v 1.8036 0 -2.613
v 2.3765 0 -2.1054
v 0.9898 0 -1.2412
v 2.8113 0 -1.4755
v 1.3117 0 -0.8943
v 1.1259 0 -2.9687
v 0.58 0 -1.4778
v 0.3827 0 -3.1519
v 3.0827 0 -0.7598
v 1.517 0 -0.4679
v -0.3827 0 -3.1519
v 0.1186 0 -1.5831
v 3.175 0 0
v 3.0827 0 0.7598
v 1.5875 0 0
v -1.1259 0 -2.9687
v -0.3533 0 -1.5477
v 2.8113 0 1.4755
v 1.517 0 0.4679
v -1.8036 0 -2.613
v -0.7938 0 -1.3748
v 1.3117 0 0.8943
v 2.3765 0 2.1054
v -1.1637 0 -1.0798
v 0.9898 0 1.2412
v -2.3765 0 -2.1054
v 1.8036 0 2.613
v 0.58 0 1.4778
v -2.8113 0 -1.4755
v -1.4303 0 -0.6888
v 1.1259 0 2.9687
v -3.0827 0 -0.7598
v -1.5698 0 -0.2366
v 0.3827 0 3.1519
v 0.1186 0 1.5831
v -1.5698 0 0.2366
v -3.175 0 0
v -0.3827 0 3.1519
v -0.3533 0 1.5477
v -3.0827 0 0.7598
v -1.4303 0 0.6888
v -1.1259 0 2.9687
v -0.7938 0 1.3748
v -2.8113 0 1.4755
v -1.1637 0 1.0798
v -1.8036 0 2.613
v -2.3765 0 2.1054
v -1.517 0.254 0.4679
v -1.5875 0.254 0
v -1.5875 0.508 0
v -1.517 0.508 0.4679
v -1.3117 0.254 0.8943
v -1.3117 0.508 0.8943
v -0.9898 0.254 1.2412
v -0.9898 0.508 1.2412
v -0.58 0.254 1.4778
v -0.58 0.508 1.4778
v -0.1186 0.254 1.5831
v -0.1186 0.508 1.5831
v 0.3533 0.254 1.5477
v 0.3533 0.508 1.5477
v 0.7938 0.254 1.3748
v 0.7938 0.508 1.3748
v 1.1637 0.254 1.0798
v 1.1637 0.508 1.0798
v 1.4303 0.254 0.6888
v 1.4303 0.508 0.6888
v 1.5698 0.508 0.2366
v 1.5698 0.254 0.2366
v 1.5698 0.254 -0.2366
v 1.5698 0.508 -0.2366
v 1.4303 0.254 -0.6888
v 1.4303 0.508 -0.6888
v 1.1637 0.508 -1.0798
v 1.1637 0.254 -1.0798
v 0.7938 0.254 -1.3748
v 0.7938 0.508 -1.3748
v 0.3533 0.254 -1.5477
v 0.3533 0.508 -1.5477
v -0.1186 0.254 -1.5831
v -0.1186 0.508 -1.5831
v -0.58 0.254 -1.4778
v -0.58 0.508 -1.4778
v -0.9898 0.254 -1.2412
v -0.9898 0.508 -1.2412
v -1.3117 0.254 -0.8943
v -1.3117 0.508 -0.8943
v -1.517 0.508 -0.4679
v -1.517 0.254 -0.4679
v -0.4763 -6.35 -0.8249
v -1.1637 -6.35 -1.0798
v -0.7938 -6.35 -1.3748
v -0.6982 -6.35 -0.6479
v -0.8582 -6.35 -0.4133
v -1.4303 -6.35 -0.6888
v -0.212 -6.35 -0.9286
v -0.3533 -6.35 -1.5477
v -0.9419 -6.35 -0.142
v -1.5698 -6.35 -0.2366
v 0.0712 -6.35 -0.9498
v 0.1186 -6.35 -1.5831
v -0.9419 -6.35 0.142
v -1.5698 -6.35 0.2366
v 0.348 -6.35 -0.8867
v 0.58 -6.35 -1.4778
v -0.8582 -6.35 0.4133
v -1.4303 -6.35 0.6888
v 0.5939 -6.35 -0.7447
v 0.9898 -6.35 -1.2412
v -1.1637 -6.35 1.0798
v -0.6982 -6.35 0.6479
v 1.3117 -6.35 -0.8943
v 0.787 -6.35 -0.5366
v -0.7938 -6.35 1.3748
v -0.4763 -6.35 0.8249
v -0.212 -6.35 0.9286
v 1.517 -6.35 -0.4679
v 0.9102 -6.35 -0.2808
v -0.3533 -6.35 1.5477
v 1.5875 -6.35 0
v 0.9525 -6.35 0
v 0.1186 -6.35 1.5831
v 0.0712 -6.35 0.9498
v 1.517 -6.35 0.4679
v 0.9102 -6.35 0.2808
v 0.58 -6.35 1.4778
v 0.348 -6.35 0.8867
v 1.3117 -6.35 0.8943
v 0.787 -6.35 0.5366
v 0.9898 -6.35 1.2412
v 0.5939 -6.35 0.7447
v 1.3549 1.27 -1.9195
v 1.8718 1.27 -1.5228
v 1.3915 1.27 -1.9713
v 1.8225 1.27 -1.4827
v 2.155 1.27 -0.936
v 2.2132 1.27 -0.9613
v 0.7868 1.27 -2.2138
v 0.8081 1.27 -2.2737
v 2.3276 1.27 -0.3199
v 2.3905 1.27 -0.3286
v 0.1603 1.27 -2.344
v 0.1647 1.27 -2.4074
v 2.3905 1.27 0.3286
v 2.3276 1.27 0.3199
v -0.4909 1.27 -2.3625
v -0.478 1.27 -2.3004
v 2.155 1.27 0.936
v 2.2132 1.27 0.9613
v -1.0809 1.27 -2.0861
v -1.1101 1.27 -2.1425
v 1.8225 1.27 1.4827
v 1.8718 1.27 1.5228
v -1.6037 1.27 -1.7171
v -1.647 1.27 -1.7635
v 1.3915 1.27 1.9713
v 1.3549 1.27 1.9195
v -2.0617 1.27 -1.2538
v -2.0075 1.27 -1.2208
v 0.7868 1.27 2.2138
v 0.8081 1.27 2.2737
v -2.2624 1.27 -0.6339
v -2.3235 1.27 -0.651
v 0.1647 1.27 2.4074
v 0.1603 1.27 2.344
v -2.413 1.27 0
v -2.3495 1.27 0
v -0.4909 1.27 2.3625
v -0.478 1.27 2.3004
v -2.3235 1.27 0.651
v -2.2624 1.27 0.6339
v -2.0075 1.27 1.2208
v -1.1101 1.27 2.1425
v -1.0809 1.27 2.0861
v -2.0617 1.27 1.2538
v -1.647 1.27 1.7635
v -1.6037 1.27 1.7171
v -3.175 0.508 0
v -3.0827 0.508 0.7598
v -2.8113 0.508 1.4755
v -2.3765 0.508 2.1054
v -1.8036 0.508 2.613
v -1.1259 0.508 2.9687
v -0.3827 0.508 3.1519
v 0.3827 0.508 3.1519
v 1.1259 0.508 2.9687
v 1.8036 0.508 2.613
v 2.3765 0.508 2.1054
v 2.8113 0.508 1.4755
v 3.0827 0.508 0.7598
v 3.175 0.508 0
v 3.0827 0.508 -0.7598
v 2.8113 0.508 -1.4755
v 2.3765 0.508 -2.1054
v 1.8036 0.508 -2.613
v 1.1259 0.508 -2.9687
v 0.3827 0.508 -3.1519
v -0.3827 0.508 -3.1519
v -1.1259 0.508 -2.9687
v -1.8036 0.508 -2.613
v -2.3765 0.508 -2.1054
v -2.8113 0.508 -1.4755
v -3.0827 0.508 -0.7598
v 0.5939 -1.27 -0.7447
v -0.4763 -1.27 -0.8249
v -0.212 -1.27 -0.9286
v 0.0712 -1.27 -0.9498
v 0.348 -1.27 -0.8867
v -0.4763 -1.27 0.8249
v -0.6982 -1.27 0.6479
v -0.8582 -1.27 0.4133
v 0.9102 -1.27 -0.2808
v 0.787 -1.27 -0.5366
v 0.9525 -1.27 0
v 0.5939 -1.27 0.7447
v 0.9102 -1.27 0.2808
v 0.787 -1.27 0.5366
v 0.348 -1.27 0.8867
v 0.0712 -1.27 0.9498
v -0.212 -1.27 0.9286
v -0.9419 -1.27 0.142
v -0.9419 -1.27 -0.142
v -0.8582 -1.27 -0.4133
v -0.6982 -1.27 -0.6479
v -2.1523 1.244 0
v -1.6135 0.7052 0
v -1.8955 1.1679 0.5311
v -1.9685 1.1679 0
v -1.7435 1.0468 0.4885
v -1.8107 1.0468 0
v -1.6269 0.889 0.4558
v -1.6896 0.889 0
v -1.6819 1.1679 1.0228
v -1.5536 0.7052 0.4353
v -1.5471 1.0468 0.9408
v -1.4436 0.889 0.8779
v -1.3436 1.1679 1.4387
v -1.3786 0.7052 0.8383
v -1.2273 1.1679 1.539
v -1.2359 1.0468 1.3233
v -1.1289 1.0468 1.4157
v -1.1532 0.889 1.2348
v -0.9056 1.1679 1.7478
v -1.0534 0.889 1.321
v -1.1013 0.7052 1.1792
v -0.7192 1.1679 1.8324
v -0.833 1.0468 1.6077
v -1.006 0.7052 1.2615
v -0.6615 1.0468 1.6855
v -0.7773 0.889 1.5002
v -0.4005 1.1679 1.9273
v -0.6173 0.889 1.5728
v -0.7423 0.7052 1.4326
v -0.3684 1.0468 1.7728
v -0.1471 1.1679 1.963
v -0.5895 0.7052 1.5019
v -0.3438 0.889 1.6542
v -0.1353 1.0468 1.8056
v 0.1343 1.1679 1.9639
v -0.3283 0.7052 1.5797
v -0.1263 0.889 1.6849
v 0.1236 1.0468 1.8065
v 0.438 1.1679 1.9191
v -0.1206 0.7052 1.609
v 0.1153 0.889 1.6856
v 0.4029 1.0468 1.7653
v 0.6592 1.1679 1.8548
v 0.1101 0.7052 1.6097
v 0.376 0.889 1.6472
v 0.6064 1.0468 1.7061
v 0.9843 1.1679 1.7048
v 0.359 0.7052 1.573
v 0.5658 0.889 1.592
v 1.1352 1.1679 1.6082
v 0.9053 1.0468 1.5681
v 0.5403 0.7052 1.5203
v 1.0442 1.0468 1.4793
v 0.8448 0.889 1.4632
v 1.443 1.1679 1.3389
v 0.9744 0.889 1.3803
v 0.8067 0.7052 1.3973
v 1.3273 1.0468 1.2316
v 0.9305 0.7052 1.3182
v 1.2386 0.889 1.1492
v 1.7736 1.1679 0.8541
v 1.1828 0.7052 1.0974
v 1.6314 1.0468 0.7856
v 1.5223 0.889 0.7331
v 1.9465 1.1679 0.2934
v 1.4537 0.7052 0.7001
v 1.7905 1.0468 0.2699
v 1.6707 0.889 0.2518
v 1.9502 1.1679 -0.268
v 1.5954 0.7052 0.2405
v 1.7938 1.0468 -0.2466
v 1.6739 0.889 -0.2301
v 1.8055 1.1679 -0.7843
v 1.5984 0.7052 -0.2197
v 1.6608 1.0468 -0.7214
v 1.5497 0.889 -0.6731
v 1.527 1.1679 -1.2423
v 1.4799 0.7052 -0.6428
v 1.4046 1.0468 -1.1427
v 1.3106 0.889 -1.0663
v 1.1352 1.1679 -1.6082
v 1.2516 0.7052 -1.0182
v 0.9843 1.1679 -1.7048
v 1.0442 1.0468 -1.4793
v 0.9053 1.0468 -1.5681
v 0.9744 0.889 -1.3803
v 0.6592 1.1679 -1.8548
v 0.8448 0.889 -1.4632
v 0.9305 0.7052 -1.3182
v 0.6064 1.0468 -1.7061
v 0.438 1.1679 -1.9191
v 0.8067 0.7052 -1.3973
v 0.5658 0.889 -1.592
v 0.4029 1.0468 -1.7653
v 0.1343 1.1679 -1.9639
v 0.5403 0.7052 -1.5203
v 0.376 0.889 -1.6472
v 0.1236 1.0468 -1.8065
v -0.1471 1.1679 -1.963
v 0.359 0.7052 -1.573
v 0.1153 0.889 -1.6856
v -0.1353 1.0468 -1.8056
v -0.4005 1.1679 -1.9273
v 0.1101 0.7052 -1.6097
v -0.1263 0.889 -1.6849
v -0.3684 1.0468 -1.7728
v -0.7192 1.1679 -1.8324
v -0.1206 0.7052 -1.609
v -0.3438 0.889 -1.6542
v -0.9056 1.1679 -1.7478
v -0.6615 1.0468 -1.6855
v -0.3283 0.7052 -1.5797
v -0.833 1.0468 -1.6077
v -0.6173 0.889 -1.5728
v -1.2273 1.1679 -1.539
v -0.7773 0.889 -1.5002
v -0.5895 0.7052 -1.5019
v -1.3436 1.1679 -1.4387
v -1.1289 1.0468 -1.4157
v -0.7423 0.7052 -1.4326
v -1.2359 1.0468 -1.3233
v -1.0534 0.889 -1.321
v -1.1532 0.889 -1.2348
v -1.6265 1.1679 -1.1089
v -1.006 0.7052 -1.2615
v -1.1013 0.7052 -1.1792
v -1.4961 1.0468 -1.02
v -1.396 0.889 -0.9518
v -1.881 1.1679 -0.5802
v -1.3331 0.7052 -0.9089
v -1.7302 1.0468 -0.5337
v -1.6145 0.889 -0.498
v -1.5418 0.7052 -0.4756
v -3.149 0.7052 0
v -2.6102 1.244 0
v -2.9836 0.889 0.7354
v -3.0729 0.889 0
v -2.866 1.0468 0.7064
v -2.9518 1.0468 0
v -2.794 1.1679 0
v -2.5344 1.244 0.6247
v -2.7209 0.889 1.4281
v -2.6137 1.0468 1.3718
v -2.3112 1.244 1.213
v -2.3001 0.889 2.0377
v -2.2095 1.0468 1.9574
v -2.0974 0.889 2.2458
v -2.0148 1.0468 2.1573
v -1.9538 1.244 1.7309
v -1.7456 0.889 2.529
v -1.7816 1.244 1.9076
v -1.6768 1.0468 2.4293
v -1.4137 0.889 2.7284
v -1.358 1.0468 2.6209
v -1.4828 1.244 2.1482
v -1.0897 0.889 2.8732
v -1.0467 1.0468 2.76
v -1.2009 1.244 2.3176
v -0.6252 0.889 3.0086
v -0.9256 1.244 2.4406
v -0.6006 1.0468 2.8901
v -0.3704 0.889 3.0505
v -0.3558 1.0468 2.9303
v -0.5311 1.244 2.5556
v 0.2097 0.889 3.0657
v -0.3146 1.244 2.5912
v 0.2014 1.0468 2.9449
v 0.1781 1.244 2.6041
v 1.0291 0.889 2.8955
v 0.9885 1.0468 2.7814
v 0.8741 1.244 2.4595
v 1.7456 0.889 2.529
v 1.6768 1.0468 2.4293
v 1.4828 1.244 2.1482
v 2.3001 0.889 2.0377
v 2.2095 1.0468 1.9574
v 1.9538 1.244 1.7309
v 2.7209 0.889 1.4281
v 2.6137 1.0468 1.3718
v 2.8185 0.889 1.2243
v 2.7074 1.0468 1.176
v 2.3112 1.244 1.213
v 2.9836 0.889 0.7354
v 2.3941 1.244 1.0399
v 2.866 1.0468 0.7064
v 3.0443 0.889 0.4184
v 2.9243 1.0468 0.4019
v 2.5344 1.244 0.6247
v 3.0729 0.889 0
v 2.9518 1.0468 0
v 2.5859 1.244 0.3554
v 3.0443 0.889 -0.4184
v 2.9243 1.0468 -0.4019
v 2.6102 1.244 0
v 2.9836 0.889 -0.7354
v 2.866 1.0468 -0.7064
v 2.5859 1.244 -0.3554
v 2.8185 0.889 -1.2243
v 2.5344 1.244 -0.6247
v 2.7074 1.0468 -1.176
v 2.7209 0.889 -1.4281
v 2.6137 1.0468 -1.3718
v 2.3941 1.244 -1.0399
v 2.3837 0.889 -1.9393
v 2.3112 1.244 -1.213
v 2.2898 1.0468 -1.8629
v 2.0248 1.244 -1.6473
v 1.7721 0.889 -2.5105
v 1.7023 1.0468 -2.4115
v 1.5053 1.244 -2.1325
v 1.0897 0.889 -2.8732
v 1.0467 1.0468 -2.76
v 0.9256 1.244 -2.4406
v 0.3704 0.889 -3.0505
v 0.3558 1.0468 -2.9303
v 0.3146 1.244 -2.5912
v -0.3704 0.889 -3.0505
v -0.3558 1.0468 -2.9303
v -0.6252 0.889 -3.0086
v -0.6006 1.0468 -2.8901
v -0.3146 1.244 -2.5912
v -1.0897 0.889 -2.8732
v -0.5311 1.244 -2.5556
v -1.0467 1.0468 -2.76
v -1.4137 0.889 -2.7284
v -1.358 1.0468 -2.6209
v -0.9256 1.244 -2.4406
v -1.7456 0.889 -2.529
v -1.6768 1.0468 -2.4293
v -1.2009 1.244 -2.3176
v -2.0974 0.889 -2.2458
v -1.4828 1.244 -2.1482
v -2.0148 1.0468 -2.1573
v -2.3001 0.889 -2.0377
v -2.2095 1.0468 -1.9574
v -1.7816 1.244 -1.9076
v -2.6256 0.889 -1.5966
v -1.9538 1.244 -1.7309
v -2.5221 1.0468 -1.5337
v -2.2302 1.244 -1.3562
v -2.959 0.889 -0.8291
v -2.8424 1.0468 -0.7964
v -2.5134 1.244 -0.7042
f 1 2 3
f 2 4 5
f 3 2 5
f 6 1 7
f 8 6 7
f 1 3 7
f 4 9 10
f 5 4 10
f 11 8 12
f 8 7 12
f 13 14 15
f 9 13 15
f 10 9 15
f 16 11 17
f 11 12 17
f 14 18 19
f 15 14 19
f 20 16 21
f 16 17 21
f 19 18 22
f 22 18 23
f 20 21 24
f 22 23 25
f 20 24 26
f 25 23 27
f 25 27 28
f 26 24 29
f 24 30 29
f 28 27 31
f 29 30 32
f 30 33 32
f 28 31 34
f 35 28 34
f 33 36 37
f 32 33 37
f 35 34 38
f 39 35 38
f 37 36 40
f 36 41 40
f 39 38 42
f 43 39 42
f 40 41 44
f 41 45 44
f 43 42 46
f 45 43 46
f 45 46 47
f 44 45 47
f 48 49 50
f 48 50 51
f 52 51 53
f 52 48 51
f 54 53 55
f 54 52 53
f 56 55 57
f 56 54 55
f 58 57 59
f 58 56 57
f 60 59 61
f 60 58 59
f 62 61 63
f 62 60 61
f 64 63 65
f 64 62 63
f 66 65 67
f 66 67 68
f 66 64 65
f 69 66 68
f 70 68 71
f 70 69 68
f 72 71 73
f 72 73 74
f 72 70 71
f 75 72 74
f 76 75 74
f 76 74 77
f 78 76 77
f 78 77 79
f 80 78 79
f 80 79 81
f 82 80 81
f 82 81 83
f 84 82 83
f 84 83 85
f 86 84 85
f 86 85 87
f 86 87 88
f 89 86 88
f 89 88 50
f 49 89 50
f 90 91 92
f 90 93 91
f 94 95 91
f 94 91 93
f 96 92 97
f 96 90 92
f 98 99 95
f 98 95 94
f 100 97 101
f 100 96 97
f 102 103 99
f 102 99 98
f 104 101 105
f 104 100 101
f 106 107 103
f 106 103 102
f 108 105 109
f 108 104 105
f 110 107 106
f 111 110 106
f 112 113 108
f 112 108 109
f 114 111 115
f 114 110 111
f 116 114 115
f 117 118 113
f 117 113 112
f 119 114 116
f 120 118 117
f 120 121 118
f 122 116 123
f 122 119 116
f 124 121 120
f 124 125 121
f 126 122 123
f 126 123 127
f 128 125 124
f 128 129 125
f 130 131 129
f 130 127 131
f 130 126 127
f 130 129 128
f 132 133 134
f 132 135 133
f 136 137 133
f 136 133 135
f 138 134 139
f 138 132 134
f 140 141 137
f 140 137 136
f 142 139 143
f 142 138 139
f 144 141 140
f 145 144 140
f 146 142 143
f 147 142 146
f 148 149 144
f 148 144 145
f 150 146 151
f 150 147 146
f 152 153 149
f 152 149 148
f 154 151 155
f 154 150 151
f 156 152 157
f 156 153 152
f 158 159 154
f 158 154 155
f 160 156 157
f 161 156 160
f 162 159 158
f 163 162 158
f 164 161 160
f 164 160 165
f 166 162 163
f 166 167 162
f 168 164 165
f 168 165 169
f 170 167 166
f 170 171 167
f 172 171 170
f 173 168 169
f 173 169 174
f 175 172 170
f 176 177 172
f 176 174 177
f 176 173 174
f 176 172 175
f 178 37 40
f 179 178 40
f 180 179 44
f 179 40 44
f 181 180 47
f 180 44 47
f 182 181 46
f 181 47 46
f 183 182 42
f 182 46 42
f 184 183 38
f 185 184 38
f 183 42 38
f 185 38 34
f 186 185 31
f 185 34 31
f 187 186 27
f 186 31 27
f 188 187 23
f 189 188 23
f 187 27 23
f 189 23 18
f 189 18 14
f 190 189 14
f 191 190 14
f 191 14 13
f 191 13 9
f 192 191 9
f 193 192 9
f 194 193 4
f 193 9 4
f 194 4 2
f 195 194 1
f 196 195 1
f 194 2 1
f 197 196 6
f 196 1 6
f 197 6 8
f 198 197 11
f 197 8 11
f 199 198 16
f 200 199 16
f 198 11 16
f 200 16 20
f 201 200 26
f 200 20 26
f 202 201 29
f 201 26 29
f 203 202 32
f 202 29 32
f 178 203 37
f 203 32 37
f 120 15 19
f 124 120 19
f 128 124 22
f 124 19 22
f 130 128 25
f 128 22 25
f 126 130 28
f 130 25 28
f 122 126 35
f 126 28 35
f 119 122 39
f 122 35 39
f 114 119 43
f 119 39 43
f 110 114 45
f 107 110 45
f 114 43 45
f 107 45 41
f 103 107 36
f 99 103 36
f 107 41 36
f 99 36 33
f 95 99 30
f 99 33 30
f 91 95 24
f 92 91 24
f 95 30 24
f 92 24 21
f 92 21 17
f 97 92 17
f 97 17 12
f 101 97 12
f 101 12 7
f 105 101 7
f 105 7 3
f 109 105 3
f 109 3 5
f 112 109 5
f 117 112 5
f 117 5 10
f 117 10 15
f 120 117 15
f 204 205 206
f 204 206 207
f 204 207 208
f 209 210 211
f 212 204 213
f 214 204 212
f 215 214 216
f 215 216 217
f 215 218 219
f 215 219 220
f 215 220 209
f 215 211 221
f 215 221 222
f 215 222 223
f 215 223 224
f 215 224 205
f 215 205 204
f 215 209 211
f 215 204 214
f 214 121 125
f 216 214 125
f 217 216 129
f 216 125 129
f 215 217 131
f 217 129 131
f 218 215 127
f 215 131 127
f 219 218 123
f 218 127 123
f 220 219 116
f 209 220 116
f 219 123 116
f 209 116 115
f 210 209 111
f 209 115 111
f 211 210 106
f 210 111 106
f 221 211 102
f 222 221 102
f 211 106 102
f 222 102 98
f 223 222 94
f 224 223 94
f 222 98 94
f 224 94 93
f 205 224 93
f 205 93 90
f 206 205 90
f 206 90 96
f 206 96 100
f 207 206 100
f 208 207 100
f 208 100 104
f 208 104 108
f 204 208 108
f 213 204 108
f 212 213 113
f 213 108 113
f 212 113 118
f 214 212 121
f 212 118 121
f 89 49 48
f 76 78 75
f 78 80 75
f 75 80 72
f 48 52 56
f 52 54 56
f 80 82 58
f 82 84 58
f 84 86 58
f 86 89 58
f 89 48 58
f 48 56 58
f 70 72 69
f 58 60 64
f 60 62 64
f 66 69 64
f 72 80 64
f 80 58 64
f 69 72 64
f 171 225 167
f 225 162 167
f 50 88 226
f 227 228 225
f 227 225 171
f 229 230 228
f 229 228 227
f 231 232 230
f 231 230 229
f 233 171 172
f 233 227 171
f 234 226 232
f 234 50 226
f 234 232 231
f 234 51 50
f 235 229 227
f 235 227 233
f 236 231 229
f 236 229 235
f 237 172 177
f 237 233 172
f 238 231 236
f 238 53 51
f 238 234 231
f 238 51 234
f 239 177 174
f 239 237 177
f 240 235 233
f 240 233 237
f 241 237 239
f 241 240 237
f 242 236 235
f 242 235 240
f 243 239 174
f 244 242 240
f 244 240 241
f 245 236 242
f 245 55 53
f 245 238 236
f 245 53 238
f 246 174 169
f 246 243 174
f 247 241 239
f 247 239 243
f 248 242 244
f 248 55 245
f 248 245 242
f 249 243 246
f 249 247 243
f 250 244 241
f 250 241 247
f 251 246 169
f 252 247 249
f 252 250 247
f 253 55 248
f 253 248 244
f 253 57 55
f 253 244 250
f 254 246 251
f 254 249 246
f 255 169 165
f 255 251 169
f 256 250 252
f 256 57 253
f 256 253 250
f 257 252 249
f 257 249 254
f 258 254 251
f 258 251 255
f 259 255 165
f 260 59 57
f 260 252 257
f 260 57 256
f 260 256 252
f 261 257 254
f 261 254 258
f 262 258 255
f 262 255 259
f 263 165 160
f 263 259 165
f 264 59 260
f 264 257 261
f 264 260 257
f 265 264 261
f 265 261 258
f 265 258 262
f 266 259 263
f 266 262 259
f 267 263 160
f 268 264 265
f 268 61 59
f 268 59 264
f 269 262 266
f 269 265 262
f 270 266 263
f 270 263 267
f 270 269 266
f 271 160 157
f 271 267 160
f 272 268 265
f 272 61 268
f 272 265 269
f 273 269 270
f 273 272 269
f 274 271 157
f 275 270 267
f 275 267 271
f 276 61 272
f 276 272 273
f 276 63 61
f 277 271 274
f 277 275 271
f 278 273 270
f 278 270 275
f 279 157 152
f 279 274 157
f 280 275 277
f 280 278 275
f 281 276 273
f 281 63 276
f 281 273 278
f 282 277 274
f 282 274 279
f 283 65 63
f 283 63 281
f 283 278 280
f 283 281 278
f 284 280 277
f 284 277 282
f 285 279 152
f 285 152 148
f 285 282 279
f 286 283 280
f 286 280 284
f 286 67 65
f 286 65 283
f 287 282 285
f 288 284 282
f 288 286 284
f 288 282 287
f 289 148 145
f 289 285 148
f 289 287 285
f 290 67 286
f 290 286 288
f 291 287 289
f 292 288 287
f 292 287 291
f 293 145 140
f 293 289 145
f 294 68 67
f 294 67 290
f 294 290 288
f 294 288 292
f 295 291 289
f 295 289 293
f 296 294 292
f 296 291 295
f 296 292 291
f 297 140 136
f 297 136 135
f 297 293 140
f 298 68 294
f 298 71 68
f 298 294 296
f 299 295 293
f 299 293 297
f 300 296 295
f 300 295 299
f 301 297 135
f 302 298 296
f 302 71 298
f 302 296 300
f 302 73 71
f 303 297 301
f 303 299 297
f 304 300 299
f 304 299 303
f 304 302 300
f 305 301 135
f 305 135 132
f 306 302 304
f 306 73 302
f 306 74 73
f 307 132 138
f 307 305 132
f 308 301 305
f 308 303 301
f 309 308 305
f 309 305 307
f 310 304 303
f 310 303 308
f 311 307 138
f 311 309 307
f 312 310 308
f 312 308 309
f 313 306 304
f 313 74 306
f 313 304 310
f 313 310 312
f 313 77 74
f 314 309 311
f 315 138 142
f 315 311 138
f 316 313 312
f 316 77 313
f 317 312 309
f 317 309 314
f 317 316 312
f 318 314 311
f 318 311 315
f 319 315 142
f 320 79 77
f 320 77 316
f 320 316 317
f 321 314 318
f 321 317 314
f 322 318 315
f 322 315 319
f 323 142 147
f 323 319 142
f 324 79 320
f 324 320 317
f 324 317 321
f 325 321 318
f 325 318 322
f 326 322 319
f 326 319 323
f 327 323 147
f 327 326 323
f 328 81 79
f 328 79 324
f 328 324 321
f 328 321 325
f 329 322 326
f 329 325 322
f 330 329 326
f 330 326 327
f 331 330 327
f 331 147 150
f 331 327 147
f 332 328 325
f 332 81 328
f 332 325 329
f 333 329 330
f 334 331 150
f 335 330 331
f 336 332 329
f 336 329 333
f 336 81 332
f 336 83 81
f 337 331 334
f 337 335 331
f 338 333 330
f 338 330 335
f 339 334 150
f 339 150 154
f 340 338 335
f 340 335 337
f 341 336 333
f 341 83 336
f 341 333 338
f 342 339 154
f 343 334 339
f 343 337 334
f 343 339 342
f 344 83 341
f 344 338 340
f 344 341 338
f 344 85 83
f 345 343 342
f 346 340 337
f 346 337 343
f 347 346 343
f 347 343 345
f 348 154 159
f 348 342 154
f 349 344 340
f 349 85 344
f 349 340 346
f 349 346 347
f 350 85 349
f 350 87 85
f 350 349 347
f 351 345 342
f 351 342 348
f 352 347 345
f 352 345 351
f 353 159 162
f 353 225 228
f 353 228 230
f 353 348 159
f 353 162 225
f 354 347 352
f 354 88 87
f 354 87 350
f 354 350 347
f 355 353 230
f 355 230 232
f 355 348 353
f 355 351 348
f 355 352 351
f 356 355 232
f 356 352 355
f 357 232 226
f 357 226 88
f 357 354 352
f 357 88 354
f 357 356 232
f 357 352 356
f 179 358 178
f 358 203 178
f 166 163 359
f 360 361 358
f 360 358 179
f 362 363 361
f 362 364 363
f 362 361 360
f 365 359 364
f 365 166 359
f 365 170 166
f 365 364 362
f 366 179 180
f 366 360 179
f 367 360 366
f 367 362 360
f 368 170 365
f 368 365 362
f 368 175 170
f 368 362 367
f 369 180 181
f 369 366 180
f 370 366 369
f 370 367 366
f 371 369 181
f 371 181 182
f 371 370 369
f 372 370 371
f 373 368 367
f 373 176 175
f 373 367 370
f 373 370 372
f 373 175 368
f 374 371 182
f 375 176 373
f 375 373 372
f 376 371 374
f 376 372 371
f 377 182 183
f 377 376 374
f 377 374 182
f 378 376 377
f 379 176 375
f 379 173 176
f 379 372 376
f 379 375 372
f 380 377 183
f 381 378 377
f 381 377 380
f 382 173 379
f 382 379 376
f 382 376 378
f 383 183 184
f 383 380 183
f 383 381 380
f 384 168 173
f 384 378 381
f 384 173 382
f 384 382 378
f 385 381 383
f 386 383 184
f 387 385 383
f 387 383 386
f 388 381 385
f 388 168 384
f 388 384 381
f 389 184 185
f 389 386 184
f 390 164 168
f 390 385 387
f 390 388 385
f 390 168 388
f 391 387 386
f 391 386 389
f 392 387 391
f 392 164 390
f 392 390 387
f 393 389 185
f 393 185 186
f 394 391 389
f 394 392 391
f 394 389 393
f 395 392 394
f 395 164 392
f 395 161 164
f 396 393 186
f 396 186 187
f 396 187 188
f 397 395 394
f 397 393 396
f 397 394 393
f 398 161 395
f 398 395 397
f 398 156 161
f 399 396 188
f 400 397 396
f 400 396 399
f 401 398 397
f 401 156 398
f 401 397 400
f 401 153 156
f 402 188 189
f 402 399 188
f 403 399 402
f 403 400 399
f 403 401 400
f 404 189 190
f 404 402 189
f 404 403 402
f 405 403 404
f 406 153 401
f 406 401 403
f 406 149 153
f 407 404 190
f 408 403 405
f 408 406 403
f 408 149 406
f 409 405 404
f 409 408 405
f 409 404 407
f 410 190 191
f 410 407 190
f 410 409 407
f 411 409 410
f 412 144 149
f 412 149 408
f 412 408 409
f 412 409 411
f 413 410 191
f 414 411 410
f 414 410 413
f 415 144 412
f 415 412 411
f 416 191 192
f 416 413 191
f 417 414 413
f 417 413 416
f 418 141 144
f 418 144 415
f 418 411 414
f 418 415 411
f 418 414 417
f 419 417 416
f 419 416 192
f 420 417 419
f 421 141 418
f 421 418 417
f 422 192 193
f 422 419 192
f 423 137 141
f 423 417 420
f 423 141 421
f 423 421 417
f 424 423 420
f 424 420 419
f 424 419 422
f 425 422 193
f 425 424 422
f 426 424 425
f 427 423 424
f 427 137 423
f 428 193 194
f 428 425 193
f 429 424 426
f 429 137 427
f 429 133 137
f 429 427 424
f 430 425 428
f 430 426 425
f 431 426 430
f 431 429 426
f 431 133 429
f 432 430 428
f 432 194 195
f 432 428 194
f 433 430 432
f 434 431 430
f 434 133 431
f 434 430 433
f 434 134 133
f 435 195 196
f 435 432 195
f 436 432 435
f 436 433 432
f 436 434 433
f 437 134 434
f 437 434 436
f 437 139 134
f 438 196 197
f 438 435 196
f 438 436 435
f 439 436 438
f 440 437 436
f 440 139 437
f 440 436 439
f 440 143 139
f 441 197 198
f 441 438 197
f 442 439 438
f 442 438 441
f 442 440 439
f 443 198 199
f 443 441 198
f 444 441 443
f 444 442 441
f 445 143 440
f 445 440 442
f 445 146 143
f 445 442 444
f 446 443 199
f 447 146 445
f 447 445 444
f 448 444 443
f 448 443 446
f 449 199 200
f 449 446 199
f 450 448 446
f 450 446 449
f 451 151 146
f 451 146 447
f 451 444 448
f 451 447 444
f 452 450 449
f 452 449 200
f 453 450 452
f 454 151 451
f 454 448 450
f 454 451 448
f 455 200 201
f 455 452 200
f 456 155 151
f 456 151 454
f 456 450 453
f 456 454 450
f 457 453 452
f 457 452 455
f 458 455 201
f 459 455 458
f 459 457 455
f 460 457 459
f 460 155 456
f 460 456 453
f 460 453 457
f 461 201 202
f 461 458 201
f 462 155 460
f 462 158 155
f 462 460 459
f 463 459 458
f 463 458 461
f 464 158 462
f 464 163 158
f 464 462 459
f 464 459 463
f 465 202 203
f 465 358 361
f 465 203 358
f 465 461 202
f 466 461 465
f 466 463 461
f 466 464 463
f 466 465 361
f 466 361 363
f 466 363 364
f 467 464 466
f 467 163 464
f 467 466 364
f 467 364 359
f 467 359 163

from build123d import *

# Parameters (mm, degrees)
F0_R     = 1.5875
F1_DEPTH = 6.35
F2_R     = 0.9525
F3_DEPTH = 5.08
F4_R     = 3.175
F4_R_2   = 1.5875
F5_DEPTH = 1.27
F6_R     = 0.762
F7_DEPTH = 0.254


with BuildPart() as f1:
    # F0 (on Front) → F1 (new body)
    with BuildSketch(Plane.XZ):
        Circle(F0_R)
    extrude(amount=F1_DEPTH)

    # F2 (on face) → F3 (cut)
    with BuildSketch(Plane.XZ.offset(6.35)):
        Circle(F2_R)
    extrude(amount=-F3_DEPTH, mode=Mode.SUBTRACT)

    # F4 (on face) → F5 (join)
    with BuildSketch(Plane(origin=(0, 0, 0), x_dir=(-1, 0, 0), z_dir=(0, 1, 0))):
        Circle(F4_R)
        Circle(F4_R_2, mode=Mode.SUBTRACT)
    extrude(amount=F5_DEPTH)

    # F6
    f6_edges = [f1.edges().sort_by_distance(p)[0] for p in [
        (3.175, 1.27, 0),
        (1.5875, 1.27, 0),
    ]]
    fillet(f6_edges, radius=F6_R)

    # F7 (add): a face of the model
    f7_faces = [f1.faces().sort_by_distance(p)[0] for p in [
        (0, 0, 0),
    ]]
    extrude(f7_faces, amount=F7_DEPTH)


solid = f1.part
